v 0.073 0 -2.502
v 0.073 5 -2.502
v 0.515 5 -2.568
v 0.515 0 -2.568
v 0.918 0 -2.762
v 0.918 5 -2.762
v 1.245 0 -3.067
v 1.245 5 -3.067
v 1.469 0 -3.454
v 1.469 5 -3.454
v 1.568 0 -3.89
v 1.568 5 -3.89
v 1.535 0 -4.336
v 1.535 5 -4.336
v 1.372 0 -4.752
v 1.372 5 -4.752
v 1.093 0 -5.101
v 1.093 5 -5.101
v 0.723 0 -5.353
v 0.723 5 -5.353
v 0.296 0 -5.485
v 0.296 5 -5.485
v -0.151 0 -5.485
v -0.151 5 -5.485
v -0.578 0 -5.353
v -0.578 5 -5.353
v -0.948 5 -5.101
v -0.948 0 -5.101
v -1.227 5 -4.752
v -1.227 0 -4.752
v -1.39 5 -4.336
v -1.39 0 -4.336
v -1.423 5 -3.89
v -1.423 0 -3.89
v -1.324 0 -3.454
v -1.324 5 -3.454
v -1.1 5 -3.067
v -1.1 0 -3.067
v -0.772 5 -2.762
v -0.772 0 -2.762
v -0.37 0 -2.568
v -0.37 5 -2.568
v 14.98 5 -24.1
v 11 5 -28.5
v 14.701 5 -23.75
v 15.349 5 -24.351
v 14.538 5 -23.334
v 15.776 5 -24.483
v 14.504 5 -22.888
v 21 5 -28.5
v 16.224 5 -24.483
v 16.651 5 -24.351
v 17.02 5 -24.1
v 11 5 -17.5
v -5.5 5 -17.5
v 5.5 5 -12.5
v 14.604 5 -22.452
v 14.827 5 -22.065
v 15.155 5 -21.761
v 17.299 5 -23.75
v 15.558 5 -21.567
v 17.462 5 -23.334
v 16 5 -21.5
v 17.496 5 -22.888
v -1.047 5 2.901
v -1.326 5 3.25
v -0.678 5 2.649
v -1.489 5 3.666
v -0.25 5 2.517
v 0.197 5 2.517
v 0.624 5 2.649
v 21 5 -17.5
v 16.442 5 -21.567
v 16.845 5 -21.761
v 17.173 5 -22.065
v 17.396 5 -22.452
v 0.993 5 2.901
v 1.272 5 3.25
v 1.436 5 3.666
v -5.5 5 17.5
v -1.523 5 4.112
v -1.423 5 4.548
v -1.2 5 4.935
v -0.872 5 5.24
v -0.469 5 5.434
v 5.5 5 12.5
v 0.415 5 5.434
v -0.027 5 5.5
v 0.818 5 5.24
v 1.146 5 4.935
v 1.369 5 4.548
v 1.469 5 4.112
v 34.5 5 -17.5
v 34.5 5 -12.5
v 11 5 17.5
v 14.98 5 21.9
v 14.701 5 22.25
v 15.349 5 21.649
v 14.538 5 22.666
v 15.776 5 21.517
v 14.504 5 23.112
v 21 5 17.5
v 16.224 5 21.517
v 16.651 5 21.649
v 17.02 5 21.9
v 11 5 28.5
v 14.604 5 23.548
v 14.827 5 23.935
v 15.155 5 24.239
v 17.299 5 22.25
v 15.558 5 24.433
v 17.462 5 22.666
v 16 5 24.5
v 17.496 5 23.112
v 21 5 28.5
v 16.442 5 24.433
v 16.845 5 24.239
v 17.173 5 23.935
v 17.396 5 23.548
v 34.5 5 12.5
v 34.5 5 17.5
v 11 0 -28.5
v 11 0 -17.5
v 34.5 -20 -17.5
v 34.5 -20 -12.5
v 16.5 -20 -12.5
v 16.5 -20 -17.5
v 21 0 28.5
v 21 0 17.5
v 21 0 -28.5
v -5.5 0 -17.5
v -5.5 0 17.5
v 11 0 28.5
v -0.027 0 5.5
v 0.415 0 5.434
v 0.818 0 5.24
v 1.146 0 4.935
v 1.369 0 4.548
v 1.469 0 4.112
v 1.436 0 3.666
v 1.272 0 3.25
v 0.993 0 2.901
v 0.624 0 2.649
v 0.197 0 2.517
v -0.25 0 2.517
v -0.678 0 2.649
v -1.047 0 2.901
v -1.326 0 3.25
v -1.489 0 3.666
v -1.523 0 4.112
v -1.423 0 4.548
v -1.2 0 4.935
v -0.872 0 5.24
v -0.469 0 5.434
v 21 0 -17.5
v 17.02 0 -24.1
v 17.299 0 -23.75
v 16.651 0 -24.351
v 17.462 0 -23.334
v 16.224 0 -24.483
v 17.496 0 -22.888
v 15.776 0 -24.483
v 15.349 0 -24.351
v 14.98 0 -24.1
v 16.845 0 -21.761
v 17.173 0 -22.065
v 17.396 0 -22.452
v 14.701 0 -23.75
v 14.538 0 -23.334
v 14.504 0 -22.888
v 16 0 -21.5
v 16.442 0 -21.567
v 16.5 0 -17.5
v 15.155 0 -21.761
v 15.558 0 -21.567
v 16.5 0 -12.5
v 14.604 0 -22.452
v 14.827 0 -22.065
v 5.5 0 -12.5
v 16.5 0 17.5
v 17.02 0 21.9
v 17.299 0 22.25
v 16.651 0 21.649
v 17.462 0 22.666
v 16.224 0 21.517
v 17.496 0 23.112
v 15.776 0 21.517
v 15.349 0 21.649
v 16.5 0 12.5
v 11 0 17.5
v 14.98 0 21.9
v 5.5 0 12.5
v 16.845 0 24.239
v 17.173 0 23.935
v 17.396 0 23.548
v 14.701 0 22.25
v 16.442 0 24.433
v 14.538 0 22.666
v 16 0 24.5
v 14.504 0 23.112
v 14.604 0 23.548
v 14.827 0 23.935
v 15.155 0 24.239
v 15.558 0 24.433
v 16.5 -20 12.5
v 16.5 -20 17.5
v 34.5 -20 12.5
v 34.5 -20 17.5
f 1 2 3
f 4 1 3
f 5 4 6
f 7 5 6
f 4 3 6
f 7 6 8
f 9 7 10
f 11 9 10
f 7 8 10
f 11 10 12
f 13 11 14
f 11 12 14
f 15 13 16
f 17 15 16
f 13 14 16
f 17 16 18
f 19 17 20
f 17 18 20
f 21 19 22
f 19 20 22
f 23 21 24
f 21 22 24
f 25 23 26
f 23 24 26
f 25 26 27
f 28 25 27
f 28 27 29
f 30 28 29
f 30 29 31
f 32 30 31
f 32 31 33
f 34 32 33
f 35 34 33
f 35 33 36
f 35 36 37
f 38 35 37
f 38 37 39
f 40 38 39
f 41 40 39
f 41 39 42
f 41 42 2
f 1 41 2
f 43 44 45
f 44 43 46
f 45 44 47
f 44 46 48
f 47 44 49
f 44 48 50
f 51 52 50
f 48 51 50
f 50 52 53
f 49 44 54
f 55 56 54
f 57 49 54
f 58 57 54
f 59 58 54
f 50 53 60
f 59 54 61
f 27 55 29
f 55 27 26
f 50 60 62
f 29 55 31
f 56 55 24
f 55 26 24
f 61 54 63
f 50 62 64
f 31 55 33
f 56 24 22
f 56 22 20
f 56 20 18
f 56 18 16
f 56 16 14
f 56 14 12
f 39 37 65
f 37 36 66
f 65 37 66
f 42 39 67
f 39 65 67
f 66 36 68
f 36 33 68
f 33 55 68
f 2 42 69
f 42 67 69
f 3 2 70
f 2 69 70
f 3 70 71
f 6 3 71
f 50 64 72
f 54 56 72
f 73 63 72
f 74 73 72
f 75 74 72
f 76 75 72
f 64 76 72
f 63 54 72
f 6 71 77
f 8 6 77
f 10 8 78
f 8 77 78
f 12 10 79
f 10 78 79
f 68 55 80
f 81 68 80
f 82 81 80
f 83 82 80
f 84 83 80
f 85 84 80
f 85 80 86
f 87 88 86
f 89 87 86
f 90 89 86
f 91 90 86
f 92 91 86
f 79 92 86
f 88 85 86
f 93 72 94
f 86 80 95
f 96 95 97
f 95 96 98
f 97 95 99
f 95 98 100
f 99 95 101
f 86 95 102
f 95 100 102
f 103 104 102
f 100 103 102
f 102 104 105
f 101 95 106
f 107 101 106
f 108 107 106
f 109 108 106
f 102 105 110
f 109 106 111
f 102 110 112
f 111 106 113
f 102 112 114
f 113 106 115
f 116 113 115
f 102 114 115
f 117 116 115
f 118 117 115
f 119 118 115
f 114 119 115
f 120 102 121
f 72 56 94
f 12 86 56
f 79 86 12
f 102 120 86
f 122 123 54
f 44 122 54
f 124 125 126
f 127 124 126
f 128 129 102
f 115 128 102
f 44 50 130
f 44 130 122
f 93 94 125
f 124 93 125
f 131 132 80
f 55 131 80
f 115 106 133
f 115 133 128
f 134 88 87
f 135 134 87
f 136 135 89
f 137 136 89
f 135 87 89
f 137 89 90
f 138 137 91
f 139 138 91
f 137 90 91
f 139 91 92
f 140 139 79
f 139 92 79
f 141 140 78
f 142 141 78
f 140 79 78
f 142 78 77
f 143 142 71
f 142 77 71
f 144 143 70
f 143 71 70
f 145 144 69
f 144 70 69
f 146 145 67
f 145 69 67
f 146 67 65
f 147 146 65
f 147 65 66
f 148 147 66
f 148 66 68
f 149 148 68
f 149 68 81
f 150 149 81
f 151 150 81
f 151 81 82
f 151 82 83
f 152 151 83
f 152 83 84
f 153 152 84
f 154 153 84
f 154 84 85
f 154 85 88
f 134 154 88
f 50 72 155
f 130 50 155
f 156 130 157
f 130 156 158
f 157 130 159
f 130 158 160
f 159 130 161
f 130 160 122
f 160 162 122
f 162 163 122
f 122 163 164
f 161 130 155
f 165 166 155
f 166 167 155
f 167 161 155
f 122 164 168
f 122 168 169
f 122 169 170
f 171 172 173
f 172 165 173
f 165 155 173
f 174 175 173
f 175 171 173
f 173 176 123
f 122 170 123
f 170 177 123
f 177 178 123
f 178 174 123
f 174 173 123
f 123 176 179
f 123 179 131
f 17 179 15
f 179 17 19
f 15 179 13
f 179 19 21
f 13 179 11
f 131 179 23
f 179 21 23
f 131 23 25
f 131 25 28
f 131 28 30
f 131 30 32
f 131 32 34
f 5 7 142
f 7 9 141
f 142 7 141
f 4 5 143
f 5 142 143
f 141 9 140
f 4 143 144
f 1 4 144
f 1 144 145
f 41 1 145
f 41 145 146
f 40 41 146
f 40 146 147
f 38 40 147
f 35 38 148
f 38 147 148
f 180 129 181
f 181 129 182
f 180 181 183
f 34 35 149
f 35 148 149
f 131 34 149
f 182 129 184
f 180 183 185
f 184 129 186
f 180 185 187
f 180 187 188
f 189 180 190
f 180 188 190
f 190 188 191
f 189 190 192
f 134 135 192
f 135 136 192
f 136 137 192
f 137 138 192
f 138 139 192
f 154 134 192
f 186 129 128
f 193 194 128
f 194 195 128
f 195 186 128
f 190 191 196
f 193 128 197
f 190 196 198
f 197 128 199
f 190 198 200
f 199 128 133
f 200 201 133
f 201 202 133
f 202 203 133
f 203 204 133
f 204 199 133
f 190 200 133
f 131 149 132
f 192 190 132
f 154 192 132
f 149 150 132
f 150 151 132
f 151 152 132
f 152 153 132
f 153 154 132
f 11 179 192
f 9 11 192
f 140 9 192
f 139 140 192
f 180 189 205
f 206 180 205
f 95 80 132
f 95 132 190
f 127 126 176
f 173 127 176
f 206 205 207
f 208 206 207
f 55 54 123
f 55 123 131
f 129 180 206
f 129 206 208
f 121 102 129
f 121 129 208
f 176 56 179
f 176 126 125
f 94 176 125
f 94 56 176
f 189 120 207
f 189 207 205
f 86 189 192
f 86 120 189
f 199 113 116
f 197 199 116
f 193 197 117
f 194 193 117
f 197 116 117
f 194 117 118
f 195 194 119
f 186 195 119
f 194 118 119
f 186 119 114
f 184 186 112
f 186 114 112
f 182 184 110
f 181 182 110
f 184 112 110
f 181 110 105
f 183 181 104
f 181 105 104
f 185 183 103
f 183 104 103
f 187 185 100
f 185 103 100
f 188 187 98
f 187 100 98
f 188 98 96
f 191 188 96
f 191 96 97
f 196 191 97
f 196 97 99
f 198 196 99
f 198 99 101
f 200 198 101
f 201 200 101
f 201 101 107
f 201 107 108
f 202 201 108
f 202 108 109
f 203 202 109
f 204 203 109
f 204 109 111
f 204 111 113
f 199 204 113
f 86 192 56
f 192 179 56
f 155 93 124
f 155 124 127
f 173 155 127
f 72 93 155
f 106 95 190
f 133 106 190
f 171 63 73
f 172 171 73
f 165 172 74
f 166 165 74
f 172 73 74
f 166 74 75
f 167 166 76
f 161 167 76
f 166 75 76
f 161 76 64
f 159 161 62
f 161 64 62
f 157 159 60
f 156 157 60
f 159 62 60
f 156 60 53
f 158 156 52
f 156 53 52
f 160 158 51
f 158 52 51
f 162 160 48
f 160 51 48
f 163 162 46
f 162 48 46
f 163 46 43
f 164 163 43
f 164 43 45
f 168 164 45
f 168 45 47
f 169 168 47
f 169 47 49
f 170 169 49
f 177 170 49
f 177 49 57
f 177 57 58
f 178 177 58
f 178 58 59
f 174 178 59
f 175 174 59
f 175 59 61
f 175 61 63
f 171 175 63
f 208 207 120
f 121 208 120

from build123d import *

# Parameters (mm, degrees)
BOSS_EXTRUDE1_DEPTH              = 5
SKETCH3_W                        = 11
SKETCH3_H                        = 5
BOSS_EXTRUDE2_DEPTH              = 5
SKETCH4_W                        = 5
SKETCH4_H                        = 5
BOSS_EXTRUDE3_DEPTH              = 21
SKETCH5_W                        = 10
SKETCH5_H                        = 5
BOSS_EXTRUDE4_DEPTH              = 20
SKETCH6_W                        = 11
SKETCH6_H                        = 5
BOSS_EXTRUDE5_DEPTH              = 5
SKETCH7_W                        = 5
SKETCH7_H                        = 5
BOSS_EXTRUDE6_DEPTH              = 21
SKETCH8_W                        = 10
SKETCH8_H                        = 5
BOSS_EXTRUDE7_DEPTH              = 20
SKETCH11_W                       = 10
SKETCH11_H                       = 5
BOSS_EXTRUDE8_DEPTH              = 3.5
SKETCH12_W                       = 10
SKETCH12_H                       = 5
BOSS_EXTRUDE9_DEPTH              = 3.5
CUT_EXTRUDE6_DEPTH               = 14.5
CUT_EXTRUDE8_DEPTH               = 41.078048855
CUT_EXTRUDE8_DEPTH_BACK          = 14.5
SKETCH17_W                       = 1.38
SKETCH17_H                       = 3.56
CUT_EXTRUDE9_DEPTH               = 14.5
CUT_EXTRUDE10_DEPTH              = 14.5
SKETCH_1_W                       = 8
SKETCH_1_H                       = 25
EXTRUDE_1_DEPTH                  = 5
SKETCH_2_W                       = 8
SKETCH_2_H                       = 25
EXTRUDE_2_DEPTH                  = 5
SKIZZE1_R                        = 1.5
SCHNITT_LINEAR_AUSTRAGEN1_DEPTH  = 10
AUFSATZ_LINEAR_AUSTRAGEN1_DEPTH  = 4
SKIZZE3_W                        = 10
SKIZZE3_H                        = 5
SCHNITT_LINEAR_AUSTRAGEN2_DEPTH  = 3.5
SCHNITT_LINEAR_AUSTRAGEN3_DEPTH  = 4
AUFSATZ_LINEAR_AUSTRAGEN3_DEPTH  = 11
SKIZZE7_R                        = 1.5
SCHNITT_LINEAR_AUSTRAGEN6_DEPTH  = 10
SKIZZE8_W                        = 10
SKIZZE8_H                        = 5
SCHNITT_LINEAR_AUSTRAGEN8_DEPTH  = 4
AUFSATZ_LINEAR_AUSTRAGEN4_DEPTH  = 4
SCHNITT_LINEAR_AUSTRAGEN9_DEPTH  = 4
AUFSATZ_LINEAR_AUSTRAGEN6_DEPTH  = 11
SKIZZE12_R                       = 1.5
SCHNITT_LINEAR_AUSTRAGEN10_DEPTH = 11


with BuildPart() as part:
    # Sketch1 → Boss-Extrude1 (new body)
    with BuildSketch(Plane(origin=(0, 0, 0), x_dir=(1, 0, 0), z_dir=(0, 1, 0))):
        Polygon((5.5, 3), (5.5, 0), (5.5, -3), (5.5, -8.5), (0, -8.5), (-5.5, -8.5), (-5.5, -3), (-5.5, 8.5), (0, 8.5), (5.5, 8.5), align=None)
    extrude(amount=BOSS_EXTRUDE1_DEPTH)

    # Sketch3 → Boss-Extrude2 (add)
    with BuildSketch(Plane.XY.offset(8.5)):
        with Locations((0, 2.5)):
            Rectangle(SKETCH3_W, SKETCH3_H)
    extrude(amount=BOSS_EXTRUDE2_DEPTH)

    # Sketch4 → Boss-Extrude3 (add)
    with BuildSketch(Plane(origin=(5.5, 0, 0), x_dir=(0, 0, -1), z_dir=(1, 0, 0))):
        with Locations((-11, 2.5)):
            Rectangle(SKETCH4_W, SKETCH4_H)
    extrude(amount=BOSS_EXTRUDE3_DEPTH)

    # Sketch5 → Boss-Extrude4 (add)
    with BuildSketch(Plane.XZ):
        with Locations((21.5, 11)):
            Rectangle(SKETCH5_W, SKETCH5_H)
    extrude(amount=BOSS_EXTRUDE4_DEPTH)

    # Sketch6 → Boss-Extrude5 (add)
    with BuildSketch(Plane(origin=(0, 0, -8.5), x_dir=(-1, 0, 0), z_dir=(0, 0, -1))):
        with Locations((0, 2.5)):
            Rectangle(SKETCH6_W, SKETCH6_H)
    extrude(amount=BOSS_EXTRUDE5_DEPTH)

    # Sketch7 → Boss-Extrude6 (add)
    with BuildSketch(Plane(origin=(5.5, 0, 0), x_dir=(0, 0, -1), z_dir=(1, 0, 0))):
        with Locations((11, 2.5)):
            Rectangle(SKETCH7_W, SKETCH7_H)
    extrude(amount=BOSS_EXTRUDE6_DEPTH)

    # Sketch8 → Boss-Extrude7 (add)
    with BuildSketch(Plane(origin=(0, 0, 0), x_dir=(-1, 0, 0), z_dir=(0, -1, 0))):
        with Locations((-21.5, 11)):
            Rectangle(SKETCH8_W, SKETCH8_H)
    extrude(amount=BOSS_EXTRUDE7_DEPTH)

    # Sketch11 → Boss-Extrude8 (add)
    with BuildSketch(Plane(origin=(0, 0, 8.5), x_dir=(-1, 0, 0), z_dir=(0, 0, -1))):
        with Locations((-21.5, -12.5)):
            Rectangle(SKETCH11_W, SKETCH11_H)
    extrude(amount=BOSS_EXTRUDE8_DEPTH)

    # Sketch12 → Boss-Extrude9 (add)
    with BuildSketch(Plane.XY.offset(-8.5)):
        with Locations((21.5, -12.5)):
            Rectangle(SKETCH12_W, SKETCH12_H)
    extrude(amount=BOSS_EXTRUDE9_DEPTH)

    # Sketch14 → Cut-Extrude6 (cut)
    with BuildSketch(Plane(origin=(26.5, 0, 0), x_dir=(0, 0, -1), z_dir=(1, 0, 0))):
        Polygon((-6.379568334, -12.879568334), (-6.379568334, -15), (-5, -15), (-5, -11.439784167), (-6.379568334, -11.439784167), align=None)
    extrude(amount=-CUT_EXTRUDE6_DEPTH, mode=Mode.SUBTRACT)

    # Sketch16 → Cut-Extrude8 (cut, two sides: drawn at the far end of the back side and taken through both)
    with BuildSketch(Plane(origin=(26.5, 0, 0), x_dir=(0, 0, -1), z_dir=(1, 0, 0)).offset(-CUT_EXTRUDE8_DEPTH_BACK)):
        Polygon((-6.379568334, -13), (-8.5, -15), (-7.439784167, -15), (-6.379568334, -15), align=None)
    extrude(amount=CUT_EXTRUDE8_DEPTH + CUT_EXTRUDE8_DEPTH_BACK, mode=Mode.SUBTRACT)

    # Sketch17 → Cut-Extrude9 (cut)
    with BuildSketch(Plane(origin=(26.5, 0, 0), x_dir=(0, 0, -1), z_dir=(1, 0, 0))):
        with Locations((5.69, -13.22)):
            Rectangle(SKETCH17_W, SKETCH17_H)
    extrude(amount=-CUT_EXTRUDE9_DEPTH, mode=Mode.SUBTRACT)

    # Sketch18 → Cut-Extrude10 (cut)
    with BuildSketch(Plane(origin=(26.5, 0, 0), x_dir=(0, 0, -1), z_dir=(1, 0, 0))):
        Polygon((6.38, -13), (6.38, -15), (8.5, -15), align=None)
    extrude(amount=-CUT_EXTRUDE10_DEPTH, mode=Mode.SUBTRACT)

    # 草图1 → 凸台-拉伸1 (add)
    with BuildSketch(Plane.XY.offset(13.5)):
        with Locations((30.5, -7.5)):
            Rectangle(SKETCH_1_W, SKETCH_1_H)
    extrude(amount=-EXTRUDE_1_DEPTH)

    # 草图2 → 凸台-拉伸2 (add)
    with BuildSketch(Plane(origin=(0, 0, -13.5), x_dir=(-1, 0, 0), z_dir=(0, 0, -1))):
        with Locations((-30.5, -7.5)):
            Rectangle(SKETCH_2_W, SKETCH_2_H)
    extrude(amount=-EXTRUDE_2_DEPTH)

    # Skizze1 → Schnitt-Linear austragen1 (cut)
    with BuildSketch(Plane(origin=(0, 5, 0), x_dir=(1, 0, 0), z_dir=(0, 1, 0))):
        with Locations(Location((-0.02687413, -4.000240759, 0), (0, 0, 270))):
            Circle(SKIZZE1_R)
        with Locations(Location((0.072523116, 4.001754227, 0), (0, 0, 270))):
            Circle(SKIZZE1_R)
    extrude(amount=-SCHNITT_LINEAR_AUSTRAGEN1_DEPTH, mode=Mode.SUBTRACT)

    # Skizze2 → Aufsatz-Linear austragen1 (add)
    with BuildSketch(Plane.XY.offset(13.5)):
        Polygon((-5.5, 5), (-5.5, 0), (16.5, 0), (16.5, -20), (34.5, -20), (34.5, 5), align=None)
    extrude(amount=AUFSATZ_LINEAR_AUSTRAGEN1_DEPTH)

    # Skizze3 → Schnitt-Linear austragen2 (cut)
    with BuildSketch(Plane(origin=(0, 0, 5), x_dir=(-1, 0, 0), z_dir=(0, 0, -1))):
        with Locations((-21.5, -12.5)):
            Rectangle(SKIZZE3_W, SKIZZE3_H)
    extrude(amount=-SCHNITT_LINEAR_AUSTRAGEN2_DEPTH, mode=Mode.SUBTRACT)

    # Skizze4 → Schnitt-Linear austragen3 (cut)
    with BuildSketch(Plane(origin=(0, 0, 8.5), x_dir=(-1, 0, 0), z_dir=(0, 0, -1))):
        Polygon((-34.5, 5), (-34.5, -20), (-16.5, -20), (-16.5, 0), (-5.5, 0), (-5.5, 5), align=None)
    extrude(amount=-SCHNITT_LINEAR_AUSTRAGEN3_DEPTH, mode=Mode.SUBTRACT)

    # Skizze6 → Aufsatz-Linear austragen3 (add)
    with BuildSketch(Plane.XY.offset(17.5)):
        Polygon((16, 5), (11, 5), (11, 0), (16.5, 0), (21, 0), (21, 5), align=None)
    extrude(amount=AUFSATZ_LINEAR_AUSTRAGEN3_DEPTH)

    # Skizze7 → Schnitt-Linear austragen6 (cut)
    with BuildSketch(Plane(origin=(0, 5, 0), x_dir=(1, 0, 0), z_dir=(0, 1, 0))):
        with Locations(Location((16, -23, 0), (0, 0, 270))):
            Circle(SKIZZE7_R)
    extrude(amount=-SCHNITT_LINEAR_AUSTRAGEN6_DEPTH, mode=Mode.SUBTRACT)

    # Skizze8 → Schnitt-Linear austragen8 (cut)
    with BuildSketch(Plane.XY.offset(-8.5)):
        with Locations((21.5, -12.5)):
            Rectangle(SKIZZE8_W, SKIZZE8_H)
    extrude(amount=SCHNITT_LINEAR_AUSTRAGEN8_DEPTH, mode=Mode.SUBTRACT)

    # Skizze9 → Aufsatz-Linear austragen4 (add)
    with BuildSketch(Plane(origin=(0, 0, -13.5), x_dir=(-1, 0, 0), z_dir=(0, 0, -1))):
        Polygon((-34.5, 5), (-34.5, -20), (-16.5, -20), (-16.5, 0), (5.5, 0), (5.5, 5), align=None)
    extrude(amount=AUFSATZ_LINEAR_AUSTRAGEN4_DEPTH)

    # Skizze10 → Schnitt-Linear austragen9 (cut)
    with BuildSketch(Plane.XY.offset(-8.5)):
        Polygon((5.5, 5), (5.5, 0), (16.5, 0), (16.5, -20), (34.5, -20), (34.5, 5), align=None)
    extrude(amount=-SCHNITT_LINEAR_AUSTRAGEN9_DEPTH, mode=Mode.SUBTRACT)

    # Skizze11 → Aufsatz-Linear austragen6 (add)
    with BuildSketch(Plane(origin=(0, 0, -17.5), x_dir=(-1, 0, 0), z_dir=(0, 0, -1))):
        Polygon((-11, 0), (-11, 5), (-21, 5), (-21, 0), (-16.5, 0), align=None)
    extrude(amount=AUFSATZ_LINEAR_AUSTRAGEN6_DEPTH)

    # Skizze12 → Schnitt-Linear austragen10 (cut)
    with BuildSketch(Plane(origin=(0, 5, 0), x_dir=(1, 0, 0), z_dir=(0, 1, 0))):
        with Locations(Location((16, 23, 0), (0, 0, 270))):
            Circle(SKIZZE12_R)
    extrude(amount=-SCHNITT_LINEAR_AUSTRAGEN10_DEPTH, mode=Mode.SUBTRACT)


solid = part.part
